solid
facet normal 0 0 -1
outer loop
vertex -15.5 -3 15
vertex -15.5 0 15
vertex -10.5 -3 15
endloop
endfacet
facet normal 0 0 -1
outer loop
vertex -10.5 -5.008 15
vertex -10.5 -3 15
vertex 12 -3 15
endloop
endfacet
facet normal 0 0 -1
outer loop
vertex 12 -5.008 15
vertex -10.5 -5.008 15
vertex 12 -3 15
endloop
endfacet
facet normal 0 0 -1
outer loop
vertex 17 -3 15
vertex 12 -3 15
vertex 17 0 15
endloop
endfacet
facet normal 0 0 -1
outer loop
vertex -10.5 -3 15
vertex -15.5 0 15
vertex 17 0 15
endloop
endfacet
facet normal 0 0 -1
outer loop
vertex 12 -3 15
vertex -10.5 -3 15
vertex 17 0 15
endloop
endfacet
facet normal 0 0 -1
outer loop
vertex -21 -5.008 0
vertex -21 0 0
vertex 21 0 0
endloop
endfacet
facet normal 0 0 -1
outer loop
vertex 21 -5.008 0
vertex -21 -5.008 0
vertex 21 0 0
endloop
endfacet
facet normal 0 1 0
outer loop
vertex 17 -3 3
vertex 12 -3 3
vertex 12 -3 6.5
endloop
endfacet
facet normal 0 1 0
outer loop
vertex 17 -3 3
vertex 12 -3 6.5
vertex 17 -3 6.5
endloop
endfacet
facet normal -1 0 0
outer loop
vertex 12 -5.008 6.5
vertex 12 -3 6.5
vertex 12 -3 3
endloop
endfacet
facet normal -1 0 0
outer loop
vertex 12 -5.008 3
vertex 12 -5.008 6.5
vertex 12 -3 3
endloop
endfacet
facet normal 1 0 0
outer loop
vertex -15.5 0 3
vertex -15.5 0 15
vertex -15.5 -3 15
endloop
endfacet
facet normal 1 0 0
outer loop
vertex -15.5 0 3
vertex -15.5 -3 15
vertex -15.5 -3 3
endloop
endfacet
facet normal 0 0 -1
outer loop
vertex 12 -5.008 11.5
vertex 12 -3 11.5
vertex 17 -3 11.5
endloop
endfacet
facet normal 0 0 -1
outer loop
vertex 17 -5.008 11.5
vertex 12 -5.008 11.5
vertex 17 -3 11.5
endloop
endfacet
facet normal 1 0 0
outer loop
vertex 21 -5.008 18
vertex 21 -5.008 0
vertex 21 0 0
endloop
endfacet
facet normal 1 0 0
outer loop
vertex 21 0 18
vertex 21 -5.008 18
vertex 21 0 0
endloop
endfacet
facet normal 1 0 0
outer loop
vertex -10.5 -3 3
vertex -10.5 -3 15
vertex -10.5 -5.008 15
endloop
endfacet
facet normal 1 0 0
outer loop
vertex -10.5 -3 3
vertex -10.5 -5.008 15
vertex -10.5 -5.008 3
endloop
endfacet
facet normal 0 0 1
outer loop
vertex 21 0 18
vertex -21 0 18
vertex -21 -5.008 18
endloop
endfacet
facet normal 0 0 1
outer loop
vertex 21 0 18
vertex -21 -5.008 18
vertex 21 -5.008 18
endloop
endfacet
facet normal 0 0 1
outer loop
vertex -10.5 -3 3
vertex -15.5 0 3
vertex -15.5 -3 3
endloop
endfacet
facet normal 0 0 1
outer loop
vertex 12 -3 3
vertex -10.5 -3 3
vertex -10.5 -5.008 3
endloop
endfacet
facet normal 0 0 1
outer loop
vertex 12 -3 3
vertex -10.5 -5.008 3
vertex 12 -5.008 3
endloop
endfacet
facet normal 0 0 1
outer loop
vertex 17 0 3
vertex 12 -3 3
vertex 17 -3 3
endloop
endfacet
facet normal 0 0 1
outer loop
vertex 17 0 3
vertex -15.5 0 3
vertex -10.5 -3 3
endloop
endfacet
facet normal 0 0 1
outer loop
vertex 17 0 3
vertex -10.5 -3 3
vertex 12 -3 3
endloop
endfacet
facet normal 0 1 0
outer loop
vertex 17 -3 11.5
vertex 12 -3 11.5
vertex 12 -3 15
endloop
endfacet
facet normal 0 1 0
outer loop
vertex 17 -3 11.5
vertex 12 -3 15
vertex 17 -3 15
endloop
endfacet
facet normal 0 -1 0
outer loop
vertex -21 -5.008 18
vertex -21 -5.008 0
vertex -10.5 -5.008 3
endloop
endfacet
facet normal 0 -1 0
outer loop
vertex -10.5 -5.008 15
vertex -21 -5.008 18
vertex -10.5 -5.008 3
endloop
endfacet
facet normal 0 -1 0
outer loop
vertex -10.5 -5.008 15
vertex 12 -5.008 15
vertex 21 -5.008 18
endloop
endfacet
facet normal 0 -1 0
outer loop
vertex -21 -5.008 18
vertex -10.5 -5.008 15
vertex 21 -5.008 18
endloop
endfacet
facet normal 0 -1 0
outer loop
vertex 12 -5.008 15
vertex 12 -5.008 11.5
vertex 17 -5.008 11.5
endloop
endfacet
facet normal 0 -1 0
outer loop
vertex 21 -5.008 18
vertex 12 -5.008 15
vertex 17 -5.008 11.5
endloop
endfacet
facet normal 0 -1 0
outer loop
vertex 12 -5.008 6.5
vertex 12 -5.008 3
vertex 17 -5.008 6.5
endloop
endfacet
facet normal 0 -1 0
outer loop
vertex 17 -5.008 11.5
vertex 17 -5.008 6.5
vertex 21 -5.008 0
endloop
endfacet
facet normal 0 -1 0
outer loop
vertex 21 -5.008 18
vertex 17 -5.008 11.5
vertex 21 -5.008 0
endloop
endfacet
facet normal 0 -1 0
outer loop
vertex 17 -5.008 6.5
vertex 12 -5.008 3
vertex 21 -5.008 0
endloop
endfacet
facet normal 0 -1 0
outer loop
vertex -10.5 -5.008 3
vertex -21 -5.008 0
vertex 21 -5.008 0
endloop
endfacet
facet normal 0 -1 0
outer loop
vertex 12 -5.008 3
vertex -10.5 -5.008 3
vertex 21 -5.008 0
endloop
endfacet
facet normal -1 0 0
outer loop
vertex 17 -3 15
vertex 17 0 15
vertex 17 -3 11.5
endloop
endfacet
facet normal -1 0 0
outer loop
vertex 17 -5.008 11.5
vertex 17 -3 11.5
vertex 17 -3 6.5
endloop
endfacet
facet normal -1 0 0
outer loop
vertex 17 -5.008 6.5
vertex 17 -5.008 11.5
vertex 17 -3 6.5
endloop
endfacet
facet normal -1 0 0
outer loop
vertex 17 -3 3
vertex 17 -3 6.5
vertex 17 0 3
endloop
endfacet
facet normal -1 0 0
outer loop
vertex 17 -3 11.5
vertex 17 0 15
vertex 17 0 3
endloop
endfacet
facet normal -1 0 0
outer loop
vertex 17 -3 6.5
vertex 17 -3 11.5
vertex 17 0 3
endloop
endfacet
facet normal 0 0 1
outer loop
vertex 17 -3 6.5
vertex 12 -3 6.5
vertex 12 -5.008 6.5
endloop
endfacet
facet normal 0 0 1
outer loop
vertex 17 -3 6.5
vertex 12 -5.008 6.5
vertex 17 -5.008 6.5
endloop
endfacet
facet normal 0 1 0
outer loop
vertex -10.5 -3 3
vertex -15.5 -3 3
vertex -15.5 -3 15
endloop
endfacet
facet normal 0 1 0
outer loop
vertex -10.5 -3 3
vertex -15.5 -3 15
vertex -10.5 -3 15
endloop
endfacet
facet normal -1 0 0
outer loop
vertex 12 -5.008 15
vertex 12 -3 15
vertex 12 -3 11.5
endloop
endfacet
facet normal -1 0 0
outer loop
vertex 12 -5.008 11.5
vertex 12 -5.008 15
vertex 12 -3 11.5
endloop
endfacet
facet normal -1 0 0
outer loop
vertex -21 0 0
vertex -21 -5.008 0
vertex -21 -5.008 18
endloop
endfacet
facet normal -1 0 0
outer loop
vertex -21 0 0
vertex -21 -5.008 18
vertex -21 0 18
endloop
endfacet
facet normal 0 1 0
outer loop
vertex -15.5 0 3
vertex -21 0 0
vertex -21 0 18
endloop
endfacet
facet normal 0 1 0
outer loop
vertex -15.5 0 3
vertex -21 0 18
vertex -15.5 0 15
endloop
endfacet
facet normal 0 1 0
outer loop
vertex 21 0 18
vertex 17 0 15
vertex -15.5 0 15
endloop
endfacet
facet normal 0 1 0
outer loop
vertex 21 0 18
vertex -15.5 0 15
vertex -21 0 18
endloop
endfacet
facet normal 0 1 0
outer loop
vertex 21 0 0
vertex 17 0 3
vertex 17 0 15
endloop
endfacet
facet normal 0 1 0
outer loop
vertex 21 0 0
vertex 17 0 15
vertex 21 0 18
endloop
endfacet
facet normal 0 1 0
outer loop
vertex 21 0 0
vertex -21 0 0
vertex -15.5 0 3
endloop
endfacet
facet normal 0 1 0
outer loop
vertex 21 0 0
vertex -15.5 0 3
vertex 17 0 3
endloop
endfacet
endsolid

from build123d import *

# Parameters (mm, degrees)
SKETCH1_W           = 42
SKETCH1_H           = 5.00807777
BOSS_EXTRUDE1_DEPTH = 18
SKETCH2_W           = 32.5
SKETCH2_H           = 12
CUT_EXTRUDE1_DEPTH  = 3
CUT_EXTRUDE2_REACH  = 29.821
SKETCH3_W           = 22.5
SKETCH3_H           = 12
CUT_EXTRUDE3_REACH  = 29.821
SKETCH4_W           = 5
SKETCH4_H           = 5


with BuildPart() as part:
    # Sketch1 → Boss-Extrude1 (new body)
    with BuildSketch(Plane.XY):
        with Locations((0, -2.504038885)):
            Rectangle(SKETCH1_W, SKETCH1_H)
    extrude(amount=BOSS_EXTRUDE1_DEPTH)

    # Sketch2 → Cut-Extrude1 (cut)
    with BuildSketch(Plane(origin=(0, 0, 0), x_dir=(1, 0, 0), z_dir=(0, 1, 0))):
        with Locations((0.75, -9)):
            Rectangle(SKETCH2_W, SKETCH2_H)
    extrude(amount=-CUT_EXTRUDE1_DEPTH, mode=Mode.SUBTRACT)

    # Sketch3 → Cut-Extrude2 (cut, up to next)
    with BuildSketch(Plane(origin=(0, -3, 0), x_dir=(1, 0, 0), z_dir=(0, 1, 0)), mode=Mode.PRIVATE) as cut_extrude2_sk1:
        with Locations((0.75, -9)):
            Rectangle(SKETCH3_W, SKETCH3_H)
    cut_extrude2_tool1 = extrude(cut_extrude2_sk1.sketch, amount=-CUT_EXTRUDE2_REACH, mode=Mode.PRIVATE) & part.part
    add(cut_extrude2_tool1.solids().sort_by_distance((0.75, -3, 9))[0], mode=Mode.SUBTRACT)

    # Sketch4 → Cut-Extrude3 (cut, up to next)
    with BuildSketch(Plane(origin=(0, -3, 0), x_dir=(1, 0, 0), z_dir=(0, 1, 0)), mode=Mode.PRIVATE) as cut_extrude3_sk1:
        with Locations((14.5, -9)):
            Rectangle(SKETCH4_W, SKETCH4_H)
    cut_extrude3_tool1 = extrude(cut_extrude3_sk1.sketch, amount=-CUT_EXTRUDE3_REACH, mode=Mode.PRIVATE) & part.part
    add(cut_extrude3_tool1.solids().sort_by_distance((14.5, -3, 9))[0], mode=Mode.SUBTRACT)


solid = part.part
